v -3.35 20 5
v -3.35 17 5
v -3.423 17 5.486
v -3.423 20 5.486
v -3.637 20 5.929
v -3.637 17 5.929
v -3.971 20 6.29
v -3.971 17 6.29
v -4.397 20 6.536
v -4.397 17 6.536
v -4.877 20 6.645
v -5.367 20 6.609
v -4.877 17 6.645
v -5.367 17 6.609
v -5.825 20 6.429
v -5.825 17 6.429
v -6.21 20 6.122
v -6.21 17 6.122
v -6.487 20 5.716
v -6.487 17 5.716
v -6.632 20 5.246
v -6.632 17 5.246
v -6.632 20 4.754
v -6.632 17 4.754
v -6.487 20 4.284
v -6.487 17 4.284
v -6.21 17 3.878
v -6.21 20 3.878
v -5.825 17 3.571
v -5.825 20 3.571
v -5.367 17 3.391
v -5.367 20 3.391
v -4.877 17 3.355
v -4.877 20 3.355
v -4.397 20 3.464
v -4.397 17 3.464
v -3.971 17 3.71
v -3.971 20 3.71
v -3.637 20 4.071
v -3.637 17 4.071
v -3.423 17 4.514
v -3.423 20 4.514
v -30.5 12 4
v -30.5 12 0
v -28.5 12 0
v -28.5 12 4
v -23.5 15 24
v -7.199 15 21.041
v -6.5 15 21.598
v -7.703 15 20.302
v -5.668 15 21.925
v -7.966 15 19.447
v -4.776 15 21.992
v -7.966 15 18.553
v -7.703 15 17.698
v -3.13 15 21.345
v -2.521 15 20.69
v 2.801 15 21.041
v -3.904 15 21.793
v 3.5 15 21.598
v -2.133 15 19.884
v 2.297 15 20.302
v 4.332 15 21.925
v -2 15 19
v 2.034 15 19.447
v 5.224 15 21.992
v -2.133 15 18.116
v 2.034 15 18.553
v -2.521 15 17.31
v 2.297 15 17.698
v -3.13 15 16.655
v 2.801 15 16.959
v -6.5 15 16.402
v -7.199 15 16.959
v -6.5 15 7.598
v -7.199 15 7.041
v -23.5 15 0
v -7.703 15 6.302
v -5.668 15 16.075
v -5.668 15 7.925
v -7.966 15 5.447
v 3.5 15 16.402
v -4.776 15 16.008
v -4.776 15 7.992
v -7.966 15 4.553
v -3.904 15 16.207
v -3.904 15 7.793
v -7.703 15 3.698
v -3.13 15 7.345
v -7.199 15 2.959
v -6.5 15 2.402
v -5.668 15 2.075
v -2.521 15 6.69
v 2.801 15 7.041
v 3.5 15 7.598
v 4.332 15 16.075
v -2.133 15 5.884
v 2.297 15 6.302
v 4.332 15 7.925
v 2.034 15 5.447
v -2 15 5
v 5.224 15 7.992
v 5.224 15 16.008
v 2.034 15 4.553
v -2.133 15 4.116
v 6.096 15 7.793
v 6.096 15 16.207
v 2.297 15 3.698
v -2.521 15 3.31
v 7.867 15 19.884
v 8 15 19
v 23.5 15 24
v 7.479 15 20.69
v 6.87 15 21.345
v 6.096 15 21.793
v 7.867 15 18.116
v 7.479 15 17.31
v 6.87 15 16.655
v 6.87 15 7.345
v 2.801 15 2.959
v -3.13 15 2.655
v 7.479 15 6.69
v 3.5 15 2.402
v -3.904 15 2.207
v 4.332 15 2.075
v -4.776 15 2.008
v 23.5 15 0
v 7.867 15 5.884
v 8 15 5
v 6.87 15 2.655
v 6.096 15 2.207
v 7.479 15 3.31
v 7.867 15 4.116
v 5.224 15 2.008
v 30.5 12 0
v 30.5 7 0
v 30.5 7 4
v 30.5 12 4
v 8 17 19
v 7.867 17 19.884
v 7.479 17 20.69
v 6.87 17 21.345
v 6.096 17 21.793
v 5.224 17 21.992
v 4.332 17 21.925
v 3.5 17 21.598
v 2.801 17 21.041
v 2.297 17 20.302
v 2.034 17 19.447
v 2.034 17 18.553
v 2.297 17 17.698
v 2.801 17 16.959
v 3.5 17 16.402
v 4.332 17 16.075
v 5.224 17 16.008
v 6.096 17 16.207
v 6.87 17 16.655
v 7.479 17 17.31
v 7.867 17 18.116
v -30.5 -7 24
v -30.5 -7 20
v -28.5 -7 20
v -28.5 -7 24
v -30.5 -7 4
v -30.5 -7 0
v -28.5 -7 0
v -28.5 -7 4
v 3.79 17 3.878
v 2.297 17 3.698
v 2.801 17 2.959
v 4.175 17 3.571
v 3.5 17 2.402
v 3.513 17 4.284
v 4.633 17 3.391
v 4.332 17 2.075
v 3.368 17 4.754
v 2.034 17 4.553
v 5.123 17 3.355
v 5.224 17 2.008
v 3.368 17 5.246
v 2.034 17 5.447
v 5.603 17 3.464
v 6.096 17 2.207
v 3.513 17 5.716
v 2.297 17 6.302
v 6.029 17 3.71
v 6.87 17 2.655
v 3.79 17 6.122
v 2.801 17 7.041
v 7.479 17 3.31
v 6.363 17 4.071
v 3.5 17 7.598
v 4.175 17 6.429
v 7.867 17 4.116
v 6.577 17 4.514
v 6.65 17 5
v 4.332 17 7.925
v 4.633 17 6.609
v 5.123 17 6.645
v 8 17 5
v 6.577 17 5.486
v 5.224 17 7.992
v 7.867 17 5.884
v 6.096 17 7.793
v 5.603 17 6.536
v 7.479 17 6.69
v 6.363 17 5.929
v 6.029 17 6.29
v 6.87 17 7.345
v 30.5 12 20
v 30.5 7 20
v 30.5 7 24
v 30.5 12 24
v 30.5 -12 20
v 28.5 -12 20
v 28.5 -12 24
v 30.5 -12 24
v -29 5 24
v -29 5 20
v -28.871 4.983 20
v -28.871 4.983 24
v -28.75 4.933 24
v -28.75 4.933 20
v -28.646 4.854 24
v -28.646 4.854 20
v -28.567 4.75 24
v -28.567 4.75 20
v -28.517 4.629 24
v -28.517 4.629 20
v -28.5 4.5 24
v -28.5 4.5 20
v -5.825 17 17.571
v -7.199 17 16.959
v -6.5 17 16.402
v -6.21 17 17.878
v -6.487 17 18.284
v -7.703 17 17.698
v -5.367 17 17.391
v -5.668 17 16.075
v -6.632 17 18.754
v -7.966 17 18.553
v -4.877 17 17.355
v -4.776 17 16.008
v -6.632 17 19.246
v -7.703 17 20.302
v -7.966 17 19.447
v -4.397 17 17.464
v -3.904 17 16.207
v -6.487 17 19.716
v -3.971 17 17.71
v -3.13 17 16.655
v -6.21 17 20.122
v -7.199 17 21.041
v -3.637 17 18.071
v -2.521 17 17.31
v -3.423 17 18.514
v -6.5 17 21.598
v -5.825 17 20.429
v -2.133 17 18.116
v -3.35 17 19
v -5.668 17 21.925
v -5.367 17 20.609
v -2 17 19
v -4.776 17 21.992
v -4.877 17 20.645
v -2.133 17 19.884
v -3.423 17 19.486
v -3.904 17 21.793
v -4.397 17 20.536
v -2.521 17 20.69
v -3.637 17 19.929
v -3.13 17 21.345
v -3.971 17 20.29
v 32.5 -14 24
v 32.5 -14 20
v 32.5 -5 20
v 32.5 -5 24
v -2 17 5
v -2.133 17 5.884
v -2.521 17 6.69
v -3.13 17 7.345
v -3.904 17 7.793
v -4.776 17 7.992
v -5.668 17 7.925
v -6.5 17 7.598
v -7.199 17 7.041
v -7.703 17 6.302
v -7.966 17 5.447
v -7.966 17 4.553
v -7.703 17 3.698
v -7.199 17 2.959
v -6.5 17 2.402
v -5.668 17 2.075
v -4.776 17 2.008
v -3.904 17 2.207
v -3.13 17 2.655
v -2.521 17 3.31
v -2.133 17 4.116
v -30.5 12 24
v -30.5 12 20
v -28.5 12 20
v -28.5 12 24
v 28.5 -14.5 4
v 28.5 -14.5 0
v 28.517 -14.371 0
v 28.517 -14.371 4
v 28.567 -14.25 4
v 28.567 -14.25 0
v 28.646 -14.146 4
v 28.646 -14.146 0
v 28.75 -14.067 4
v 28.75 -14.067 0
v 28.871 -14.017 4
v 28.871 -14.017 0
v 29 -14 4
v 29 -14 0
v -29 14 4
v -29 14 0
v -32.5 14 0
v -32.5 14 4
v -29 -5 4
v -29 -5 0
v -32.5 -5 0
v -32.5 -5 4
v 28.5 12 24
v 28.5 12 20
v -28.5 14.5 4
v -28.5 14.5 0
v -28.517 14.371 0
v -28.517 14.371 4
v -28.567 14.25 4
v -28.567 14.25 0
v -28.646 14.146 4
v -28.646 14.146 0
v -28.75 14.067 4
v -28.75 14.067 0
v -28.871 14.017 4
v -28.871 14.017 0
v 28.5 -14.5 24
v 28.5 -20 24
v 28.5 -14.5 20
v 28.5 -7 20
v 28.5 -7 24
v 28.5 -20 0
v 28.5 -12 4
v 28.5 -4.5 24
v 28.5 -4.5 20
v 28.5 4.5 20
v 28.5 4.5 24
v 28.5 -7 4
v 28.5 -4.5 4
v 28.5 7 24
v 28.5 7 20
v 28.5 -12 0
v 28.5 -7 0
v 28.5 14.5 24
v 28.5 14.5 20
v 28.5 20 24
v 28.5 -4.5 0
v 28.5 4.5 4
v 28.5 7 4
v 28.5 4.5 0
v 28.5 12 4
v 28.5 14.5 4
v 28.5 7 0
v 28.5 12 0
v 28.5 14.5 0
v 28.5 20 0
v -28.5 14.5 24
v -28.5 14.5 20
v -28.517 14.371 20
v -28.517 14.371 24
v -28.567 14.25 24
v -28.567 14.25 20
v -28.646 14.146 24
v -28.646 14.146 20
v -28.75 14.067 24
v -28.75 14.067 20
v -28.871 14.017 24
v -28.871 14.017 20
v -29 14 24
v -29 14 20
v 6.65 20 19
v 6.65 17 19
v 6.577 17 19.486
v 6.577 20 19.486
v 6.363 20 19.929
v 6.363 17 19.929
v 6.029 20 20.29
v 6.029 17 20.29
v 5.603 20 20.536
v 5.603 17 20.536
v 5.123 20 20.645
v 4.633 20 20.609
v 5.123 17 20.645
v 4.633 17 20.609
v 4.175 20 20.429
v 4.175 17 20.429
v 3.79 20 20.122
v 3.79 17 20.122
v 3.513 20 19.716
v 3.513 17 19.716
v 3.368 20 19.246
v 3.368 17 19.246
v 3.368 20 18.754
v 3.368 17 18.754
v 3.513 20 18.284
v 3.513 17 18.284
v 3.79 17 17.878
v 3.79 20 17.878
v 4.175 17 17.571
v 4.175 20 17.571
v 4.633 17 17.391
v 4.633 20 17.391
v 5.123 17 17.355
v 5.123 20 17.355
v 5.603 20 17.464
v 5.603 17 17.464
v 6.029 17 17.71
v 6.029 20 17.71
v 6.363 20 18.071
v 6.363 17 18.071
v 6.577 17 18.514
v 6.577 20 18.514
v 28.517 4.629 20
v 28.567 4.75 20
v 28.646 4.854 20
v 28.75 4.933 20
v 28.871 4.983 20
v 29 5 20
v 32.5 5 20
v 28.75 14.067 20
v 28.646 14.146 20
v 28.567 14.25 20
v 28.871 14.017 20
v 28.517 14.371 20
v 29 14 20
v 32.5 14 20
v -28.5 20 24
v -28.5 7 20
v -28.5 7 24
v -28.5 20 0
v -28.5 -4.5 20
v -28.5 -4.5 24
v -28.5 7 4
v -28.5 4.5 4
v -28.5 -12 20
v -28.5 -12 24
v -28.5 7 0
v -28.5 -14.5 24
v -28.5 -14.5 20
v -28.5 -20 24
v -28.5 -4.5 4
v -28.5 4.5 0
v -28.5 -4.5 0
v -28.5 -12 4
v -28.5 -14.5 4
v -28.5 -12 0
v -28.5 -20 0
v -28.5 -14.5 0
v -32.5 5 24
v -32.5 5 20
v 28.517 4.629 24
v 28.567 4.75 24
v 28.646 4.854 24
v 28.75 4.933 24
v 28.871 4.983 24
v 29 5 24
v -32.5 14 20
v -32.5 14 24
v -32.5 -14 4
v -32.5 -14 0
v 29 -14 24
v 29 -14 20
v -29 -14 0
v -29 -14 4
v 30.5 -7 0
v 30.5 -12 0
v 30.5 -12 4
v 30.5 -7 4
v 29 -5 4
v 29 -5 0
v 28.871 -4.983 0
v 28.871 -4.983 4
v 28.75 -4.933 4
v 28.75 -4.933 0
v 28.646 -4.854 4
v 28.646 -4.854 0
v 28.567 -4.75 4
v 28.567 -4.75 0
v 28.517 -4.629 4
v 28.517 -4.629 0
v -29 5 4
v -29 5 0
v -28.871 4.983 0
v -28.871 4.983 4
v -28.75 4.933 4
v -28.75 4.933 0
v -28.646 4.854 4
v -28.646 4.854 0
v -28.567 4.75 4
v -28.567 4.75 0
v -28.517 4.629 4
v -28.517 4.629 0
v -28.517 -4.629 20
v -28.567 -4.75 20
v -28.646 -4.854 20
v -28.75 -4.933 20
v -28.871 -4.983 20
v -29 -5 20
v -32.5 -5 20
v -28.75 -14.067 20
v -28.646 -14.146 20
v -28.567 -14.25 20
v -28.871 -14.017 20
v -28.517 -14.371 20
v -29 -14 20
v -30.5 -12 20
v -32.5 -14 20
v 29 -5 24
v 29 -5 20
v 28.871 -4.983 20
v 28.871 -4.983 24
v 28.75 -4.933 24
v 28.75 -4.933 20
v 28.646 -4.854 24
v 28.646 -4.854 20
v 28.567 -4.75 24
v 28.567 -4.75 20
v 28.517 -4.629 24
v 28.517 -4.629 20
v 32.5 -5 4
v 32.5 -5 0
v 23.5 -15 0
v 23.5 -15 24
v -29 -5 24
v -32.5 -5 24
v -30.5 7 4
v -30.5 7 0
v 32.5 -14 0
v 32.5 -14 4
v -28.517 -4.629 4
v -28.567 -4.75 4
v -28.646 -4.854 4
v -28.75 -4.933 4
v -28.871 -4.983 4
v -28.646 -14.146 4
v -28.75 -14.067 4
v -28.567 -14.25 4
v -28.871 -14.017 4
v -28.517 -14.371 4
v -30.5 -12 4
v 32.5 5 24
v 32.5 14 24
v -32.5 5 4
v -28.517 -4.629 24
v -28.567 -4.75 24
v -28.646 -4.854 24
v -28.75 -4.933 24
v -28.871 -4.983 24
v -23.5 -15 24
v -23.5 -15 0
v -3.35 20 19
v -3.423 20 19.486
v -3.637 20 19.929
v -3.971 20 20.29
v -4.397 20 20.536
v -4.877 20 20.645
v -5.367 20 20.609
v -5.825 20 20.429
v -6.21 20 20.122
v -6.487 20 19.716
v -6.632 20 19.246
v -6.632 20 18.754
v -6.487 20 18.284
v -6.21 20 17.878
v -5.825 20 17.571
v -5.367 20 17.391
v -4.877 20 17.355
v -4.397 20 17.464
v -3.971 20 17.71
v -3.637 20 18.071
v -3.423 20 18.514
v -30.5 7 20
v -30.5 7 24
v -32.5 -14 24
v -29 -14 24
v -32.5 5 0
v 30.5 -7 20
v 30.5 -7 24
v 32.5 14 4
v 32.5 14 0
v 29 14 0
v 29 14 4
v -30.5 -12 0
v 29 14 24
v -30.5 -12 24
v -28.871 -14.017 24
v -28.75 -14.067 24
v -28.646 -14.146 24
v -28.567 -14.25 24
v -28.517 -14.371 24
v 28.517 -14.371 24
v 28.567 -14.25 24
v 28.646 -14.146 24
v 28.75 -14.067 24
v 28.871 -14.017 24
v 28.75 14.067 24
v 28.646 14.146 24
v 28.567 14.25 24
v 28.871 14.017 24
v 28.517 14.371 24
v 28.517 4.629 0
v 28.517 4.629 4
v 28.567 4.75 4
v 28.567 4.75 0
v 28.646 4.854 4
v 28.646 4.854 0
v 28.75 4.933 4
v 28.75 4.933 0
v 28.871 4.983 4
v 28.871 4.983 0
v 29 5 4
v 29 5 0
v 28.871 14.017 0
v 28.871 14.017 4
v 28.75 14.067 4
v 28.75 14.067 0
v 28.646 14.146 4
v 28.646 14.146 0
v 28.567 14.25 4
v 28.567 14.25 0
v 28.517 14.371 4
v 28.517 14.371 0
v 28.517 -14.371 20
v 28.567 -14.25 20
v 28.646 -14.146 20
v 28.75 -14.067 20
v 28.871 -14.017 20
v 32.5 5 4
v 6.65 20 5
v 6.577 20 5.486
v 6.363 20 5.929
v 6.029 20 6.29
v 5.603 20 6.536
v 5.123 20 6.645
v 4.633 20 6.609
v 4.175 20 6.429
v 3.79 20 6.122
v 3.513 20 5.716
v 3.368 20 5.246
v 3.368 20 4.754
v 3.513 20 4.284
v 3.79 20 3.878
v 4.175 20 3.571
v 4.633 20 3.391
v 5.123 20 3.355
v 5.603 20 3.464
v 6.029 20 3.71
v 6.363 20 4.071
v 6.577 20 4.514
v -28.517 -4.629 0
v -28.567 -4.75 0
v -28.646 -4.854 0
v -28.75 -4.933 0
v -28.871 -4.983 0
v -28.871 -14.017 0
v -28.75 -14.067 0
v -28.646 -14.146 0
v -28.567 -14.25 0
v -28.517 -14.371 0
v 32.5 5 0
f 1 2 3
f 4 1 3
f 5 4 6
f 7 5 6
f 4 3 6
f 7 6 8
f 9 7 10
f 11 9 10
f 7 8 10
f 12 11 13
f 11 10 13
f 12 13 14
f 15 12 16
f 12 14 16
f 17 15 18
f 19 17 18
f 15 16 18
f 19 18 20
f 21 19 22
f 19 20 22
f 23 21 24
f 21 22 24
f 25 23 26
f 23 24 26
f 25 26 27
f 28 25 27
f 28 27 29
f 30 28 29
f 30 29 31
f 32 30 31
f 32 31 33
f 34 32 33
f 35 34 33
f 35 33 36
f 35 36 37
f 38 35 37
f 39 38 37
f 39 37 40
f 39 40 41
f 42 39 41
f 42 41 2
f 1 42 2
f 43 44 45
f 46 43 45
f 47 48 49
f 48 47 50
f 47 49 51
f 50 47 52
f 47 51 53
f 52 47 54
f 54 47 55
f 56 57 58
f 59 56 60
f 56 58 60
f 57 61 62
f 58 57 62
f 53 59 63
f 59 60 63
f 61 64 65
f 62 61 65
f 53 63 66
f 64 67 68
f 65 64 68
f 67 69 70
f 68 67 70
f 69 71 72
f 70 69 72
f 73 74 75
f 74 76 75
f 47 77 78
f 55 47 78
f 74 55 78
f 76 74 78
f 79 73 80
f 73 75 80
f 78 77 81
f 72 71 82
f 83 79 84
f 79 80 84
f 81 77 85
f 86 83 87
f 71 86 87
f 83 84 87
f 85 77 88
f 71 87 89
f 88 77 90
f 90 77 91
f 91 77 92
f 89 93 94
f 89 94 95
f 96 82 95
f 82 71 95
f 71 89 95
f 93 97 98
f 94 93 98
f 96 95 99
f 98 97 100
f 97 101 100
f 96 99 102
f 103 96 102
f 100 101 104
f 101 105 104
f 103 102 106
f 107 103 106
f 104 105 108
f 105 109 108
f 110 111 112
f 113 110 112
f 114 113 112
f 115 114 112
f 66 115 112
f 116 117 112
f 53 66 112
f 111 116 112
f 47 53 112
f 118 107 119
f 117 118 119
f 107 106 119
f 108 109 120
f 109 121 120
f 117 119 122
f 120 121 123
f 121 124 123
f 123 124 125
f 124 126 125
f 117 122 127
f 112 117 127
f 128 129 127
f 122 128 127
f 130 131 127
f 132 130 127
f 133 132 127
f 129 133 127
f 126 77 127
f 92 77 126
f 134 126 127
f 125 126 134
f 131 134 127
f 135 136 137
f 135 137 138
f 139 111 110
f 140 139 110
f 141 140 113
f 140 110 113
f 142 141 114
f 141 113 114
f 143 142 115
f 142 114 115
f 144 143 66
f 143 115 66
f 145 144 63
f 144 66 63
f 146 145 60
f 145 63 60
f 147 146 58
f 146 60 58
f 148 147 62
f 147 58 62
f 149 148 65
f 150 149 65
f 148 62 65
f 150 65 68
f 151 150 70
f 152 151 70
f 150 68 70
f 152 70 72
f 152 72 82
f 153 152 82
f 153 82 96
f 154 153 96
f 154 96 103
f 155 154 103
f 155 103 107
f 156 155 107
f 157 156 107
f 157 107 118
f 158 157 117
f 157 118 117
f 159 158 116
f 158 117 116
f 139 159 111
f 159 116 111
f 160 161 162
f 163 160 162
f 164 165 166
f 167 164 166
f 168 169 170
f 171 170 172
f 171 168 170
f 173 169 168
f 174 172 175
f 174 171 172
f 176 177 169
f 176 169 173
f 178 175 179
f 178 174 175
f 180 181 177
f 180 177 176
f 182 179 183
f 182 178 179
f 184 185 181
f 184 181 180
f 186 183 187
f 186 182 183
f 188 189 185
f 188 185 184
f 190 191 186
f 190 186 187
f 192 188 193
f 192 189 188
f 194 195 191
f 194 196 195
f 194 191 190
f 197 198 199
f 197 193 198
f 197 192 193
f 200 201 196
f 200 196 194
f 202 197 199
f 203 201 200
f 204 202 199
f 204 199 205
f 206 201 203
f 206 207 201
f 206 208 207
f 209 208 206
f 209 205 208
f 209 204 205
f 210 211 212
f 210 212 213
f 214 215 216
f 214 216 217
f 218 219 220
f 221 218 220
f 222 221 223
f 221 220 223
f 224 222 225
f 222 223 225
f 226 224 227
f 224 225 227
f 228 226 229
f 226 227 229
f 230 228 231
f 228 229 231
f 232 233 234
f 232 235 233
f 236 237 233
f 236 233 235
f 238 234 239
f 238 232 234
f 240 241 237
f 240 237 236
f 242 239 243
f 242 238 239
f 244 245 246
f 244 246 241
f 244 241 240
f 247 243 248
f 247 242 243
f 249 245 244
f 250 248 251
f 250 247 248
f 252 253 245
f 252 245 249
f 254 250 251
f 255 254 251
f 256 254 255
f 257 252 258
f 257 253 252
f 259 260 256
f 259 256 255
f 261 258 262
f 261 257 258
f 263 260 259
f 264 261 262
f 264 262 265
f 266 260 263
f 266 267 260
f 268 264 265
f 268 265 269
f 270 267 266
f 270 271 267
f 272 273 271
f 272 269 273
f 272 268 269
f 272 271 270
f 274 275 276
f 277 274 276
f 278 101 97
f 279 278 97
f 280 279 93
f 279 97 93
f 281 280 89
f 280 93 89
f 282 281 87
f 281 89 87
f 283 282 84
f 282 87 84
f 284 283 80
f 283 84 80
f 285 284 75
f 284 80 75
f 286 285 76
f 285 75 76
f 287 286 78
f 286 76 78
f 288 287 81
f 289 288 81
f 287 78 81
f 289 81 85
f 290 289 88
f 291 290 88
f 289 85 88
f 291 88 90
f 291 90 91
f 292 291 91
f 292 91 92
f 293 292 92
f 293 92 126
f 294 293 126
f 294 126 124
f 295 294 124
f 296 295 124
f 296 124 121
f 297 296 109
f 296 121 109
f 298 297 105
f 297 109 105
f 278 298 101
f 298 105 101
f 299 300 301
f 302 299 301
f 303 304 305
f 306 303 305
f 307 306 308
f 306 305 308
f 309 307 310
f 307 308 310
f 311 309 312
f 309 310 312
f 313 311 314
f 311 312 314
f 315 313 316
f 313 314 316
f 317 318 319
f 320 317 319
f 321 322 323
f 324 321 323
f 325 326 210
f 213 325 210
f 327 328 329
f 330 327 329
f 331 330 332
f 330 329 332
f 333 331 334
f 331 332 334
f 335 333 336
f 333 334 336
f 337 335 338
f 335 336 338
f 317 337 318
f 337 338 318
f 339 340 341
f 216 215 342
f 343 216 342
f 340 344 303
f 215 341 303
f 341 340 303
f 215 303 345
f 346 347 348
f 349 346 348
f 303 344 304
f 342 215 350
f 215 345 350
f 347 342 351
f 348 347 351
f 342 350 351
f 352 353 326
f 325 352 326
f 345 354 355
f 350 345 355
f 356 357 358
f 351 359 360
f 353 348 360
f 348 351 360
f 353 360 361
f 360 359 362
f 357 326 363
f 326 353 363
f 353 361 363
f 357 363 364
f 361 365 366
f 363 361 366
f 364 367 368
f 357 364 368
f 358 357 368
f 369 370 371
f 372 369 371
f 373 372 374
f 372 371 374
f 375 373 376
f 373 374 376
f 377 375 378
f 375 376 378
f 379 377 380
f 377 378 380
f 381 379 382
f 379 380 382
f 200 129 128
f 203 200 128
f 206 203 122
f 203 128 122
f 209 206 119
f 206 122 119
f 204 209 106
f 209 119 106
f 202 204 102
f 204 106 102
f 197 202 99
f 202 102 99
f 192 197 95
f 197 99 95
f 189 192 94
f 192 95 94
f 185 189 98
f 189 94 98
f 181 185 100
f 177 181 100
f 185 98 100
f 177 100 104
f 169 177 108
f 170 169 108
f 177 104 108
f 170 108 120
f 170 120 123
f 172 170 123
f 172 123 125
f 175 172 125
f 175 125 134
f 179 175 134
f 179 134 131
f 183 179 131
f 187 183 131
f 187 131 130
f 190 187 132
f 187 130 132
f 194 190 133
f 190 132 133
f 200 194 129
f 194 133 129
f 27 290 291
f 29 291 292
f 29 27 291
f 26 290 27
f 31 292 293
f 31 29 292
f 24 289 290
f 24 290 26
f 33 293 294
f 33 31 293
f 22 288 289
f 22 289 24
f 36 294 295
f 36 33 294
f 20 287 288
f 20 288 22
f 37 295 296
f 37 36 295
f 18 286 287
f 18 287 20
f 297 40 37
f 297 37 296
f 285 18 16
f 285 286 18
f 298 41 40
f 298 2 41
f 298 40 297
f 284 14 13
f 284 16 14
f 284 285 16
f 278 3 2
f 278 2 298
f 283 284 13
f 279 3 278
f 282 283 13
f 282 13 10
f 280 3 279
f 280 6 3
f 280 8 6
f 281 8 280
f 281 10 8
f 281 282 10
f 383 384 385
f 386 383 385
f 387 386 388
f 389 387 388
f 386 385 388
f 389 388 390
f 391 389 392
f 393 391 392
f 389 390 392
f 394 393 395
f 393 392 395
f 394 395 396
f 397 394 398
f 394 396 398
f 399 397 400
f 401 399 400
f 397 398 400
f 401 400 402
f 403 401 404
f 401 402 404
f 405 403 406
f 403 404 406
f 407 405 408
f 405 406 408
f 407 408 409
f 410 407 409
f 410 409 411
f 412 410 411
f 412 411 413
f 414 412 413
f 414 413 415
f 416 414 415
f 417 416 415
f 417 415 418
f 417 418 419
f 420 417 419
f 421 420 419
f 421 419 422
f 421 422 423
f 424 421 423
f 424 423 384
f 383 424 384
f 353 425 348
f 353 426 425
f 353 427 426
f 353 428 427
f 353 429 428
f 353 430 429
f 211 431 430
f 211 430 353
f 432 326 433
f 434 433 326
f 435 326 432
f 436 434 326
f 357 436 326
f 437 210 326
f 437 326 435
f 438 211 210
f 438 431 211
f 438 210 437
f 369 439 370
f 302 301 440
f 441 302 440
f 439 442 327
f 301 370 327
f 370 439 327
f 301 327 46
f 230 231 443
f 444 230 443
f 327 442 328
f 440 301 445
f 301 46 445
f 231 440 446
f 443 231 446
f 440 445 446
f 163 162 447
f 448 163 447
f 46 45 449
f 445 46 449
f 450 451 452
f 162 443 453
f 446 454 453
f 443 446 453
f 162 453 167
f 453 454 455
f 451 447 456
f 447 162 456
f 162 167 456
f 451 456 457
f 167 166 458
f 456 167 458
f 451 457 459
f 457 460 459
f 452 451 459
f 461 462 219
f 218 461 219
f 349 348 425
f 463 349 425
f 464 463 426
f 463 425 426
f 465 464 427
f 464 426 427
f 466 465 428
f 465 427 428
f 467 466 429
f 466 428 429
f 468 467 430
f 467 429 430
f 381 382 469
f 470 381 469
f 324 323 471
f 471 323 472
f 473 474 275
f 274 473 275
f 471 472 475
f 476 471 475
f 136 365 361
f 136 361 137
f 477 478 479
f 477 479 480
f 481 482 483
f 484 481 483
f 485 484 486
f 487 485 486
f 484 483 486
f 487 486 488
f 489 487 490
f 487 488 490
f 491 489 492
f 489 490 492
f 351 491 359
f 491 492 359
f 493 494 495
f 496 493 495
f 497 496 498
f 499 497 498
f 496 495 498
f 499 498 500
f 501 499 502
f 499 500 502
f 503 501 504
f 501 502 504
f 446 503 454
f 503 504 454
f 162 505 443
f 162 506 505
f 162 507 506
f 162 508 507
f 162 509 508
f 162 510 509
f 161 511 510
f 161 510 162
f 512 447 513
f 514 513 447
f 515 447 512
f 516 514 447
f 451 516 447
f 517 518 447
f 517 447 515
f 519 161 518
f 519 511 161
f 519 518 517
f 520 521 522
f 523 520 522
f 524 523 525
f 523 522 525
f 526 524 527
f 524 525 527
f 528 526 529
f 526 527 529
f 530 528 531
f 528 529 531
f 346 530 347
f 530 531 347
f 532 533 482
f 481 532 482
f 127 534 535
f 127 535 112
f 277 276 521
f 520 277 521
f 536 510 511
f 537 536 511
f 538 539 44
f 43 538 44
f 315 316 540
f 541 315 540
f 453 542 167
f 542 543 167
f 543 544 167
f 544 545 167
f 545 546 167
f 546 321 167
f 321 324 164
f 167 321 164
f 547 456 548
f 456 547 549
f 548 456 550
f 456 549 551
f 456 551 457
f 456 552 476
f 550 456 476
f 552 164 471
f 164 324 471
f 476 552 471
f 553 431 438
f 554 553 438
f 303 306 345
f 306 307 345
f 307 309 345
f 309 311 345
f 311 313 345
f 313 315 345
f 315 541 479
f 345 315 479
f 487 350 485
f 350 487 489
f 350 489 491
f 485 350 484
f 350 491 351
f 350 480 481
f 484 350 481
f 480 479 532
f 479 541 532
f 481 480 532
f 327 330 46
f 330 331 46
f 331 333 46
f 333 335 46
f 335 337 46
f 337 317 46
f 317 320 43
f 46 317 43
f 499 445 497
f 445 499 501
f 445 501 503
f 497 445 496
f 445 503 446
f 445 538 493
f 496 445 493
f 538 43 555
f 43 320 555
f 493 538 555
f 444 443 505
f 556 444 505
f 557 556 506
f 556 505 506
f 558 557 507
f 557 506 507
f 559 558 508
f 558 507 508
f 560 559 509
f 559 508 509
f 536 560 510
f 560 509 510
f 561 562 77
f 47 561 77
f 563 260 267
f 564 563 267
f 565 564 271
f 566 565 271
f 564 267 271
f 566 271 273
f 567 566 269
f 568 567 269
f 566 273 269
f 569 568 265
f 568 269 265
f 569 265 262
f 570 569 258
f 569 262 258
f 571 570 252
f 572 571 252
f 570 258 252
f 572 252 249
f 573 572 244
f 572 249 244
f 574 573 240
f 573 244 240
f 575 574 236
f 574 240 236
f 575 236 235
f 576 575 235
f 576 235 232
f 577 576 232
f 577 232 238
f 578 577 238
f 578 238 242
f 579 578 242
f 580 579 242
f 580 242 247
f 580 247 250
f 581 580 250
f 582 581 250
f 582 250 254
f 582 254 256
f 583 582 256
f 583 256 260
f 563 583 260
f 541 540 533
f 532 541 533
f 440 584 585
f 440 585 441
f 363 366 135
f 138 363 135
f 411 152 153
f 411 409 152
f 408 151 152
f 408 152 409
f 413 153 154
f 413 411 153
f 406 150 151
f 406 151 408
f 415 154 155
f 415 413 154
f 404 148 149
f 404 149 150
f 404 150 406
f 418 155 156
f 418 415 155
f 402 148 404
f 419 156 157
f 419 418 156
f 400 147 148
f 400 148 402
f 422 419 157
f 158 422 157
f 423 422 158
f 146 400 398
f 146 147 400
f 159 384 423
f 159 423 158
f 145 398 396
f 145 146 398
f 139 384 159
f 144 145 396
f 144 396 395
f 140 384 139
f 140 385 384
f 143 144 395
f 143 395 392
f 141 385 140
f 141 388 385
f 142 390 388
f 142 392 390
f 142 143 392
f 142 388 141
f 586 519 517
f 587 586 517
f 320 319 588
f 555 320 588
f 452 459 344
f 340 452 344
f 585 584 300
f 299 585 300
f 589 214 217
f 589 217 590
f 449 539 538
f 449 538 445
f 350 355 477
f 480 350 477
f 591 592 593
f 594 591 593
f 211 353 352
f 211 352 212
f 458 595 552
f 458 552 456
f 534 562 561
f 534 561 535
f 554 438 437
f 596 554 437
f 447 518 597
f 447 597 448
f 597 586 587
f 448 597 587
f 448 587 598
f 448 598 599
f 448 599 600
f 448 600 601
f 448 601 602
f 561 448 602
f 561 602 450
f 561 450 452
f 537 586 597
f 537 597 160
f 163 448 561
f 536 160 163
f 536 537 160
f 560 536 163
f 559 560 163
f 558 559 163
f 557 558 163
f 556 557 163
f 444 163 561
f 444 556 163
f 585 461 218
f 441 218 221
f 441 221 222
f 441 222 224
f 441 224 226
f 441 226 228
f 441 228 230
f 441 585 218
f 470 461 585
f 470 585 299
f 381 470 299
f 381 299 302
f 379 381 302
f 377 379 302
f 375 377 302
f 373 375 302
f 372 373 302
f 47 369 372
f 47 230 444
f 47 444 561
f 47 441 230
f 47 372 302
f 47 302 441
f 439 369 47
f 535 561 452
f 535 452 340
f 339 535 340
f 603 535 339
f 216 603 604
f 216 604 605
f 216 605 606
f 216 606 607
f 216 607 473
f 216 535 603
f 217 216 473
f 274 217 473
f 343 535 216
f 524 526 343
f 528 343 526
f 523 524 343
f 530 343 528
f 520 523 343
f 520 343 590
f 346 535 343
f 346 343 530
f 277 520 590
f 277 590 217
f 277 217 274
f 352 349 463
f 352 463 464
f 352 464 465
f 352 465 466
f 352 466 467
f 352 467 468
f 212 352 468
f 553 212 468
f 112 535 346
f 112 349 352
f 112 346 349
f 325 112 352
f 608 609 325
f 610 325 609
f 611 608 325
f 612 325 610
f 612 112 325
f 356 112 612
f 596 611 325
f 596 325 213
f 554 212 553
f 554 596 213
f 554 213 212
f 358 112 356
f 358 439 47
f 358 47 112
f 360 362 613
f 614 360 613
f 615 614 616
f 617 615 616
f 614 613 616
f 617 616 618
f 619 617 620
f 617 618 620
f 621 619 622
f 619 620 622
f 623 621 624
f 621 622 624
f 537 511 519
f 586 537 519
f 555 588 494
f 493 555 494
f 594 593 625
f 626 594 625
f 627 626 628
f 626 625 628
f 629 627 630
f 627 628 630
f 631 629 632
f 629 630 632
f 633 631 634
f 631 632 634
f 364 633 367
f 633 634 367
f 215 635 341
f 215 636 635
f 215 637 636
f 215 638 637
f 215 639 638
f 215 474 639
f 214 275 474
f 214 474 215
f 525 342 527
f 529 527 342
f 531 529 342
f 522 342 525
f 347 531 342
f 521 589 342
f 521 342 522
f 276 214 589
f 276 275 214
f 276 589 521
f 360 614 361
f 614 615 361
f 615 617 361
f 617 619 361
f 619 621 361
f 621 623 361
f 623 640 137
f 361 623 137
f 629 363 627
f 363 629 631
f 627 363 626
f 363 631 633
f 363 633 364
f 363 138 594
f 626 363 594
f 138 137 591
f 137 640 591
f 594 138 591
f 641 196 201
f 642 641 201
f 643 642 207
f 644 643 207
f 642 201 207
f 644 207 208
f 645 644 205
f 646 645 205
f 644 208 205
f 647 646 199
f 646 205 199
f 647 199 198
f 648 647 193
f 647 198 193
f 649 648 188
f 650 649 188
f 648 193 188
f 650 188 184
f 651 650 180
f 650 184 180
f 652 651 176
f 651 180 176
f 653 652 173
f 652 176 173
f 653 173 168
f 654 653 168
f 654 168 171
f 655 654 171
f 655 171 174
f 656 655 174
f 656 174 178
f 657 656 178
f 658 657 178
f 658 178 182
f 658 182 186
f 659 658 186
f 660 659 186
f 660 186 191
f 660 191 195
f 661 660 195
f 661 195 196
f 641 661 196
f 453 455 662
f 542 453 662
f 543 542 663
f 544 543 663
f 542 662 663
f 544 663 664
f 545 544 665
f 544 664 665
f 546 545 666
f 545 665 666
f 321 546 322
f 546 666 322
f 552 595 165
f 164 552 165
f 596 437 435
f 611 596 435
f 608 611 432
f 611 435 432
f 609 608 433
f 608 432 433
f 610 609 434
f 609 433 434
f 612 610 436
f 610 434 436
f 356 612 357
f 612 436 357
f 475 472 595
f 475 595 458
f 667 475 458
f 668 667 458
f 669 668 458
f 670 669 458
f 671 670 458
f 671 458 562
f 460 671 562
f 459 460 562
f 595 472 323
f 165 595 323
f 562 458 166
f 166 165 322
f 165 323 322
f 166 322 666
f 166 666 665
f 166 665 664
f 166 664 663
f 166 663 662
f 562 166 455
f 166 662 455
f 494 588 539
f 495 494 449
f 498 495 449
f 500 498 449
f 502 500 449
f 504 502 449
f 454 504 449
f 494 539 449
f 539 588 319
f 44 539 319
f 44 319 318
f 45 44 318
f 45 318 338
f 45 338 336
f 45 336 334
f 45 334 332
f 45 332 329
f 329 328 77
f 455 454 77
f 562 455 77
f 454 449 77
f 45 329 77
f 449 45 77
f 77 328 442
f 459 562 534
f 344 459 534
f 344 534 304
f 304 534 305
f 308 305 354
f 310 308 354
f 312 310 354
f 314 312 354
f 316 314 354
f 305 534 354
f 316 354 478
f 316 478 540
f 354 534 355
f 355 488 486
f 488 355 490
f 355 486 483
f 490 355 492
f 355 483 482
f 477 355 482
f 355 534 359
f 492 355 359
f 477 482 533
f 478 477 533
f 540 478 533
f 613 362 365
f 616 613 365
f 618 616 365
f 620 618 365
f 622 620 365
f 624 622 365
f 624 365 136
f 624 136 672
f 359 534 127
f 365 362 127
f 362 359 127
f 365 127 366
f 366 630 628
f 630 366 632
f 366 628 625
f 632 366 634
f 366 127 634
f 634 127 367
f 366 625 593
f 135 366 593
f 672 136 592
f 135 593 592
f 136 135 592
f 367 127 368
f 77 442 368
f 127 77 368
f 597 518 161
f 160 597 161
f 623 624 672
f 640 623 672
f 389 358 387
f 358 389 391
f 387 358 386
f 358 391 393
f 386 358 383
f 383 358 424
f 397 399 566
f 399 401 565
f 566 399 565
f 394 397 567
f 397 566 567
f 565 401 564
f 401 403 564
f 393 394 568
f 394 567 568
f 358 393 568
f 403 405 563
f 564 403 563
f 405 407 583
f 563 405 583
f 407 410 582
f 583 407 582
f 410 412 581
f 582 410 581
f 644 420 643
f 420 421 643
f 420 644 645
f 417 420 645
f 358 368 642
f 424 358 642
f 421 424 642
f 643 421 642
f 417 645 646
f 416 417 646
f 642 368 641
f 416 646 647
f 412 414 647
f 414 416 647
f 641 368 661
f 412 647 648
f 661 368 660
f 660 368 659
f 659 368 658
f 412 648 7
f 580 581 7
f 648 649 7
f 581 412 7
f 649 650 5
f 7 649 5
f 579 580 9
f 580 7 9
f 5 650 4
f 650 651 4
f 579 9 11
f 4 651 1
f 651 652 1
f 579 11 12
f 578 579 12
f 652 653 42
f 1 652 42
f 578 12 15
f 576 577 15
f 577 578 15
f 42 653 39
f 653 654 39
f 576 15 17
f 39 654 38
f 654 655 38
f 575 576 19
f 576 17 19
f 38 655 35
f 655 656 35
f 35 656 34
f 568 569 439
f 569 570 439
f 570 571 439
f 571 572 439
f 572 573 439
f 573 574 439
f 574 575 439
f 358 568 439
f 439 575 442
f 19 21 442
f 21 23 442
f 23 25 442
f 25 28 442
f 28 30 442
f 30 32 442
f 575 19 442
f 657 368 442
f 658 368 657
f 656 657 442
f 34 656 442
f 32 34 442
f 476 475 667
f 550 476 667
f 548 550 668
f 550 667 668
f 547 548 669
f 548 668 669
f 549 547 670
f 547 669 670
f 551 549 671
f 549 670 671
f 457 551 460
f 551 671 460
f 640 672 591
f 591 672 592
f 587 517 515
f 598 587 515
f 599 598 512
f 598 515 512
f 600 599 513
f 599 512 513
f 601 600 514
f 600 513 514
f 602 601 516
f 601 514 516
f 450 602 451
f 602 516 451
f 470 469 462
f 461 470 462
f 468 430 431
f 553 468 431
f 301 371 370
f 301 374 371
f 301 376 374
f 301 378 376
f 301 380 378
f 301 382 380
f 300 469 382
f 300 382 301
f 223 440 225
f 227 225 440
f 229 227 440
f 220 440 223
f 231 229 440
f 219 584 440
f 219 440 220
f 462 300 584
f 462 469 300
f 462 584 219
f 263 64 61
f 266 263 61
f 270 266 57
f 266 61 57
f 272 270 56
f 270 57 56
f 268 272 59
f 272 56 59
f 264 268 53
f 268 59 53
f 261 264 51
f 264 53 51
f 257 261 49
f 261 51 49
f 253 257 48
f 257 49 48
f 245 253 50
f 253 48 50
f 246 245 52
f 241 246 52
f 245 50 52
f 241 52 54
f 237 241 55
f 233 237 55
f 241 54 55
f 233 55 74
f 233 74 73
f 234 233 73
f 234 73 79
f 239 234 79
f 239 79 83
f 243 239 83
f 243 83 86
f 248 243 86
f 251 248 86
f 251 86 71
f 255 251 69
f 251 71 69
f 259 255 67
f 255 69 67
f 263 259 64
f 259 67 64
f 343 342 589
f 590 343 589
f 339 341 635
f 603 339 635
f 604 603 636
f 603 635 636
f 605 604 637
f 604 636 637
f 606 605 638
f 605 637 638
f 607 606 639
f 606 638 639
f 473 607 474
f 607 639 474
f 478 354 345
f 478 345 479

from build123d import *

# Parameters (mm, degrees)
F0_W     = 2
F0_H     = 5
F0_W_2   = 47
F0_H_2   = 30
F1_DEPTH = 24
F2_W     = 40
F2_H     = 16
F3_DEPTH = 4
F4_W     = 40
F4_H     = 16
F5_DEPTH = 4
F6_R     = 1.65
F7_DEPTH = 25
F8_R     = 3
F9_DEPTH = 2


with BuildPart() as f1:
    # F0 (on Top) → F1 (new body)
    with BuildSketch(Plane.XY):
        with BuildLine():
            Line((28.5, 14.5), (28.5, 20))
            Line((28.5, 20), (-28.5, 20))
            Line((-28.5, 20), (-28.5, 14.5))
            ThreePointArc((-28.5, 14.5), (-28.646447, 14.146447), (-29, 14))
            Line((-29, 14), (-32.5, 14))
            Line((-32.5, 14), (-32.5, 5))
            Line((-32.5, 5), (-29, 5))
            ThreePointArc((-29, 5), (-28.646447, 4.853553), (-28.5, 4.5))
            Line((-28.5, 4.5), (-28.5, -4.5))
            ThreePointArc((-28.5, -4.5), (-28.646447, -4.853553), (-29, -5))
            Line((-29, -5), (-32.5, -5))
            Line((-32.5, -5), (-32.5, -14))
            Line((-32.5, -14), (-29, -14))
            ThreePointArc((-29, -14), (-28.646447, -14.146447), (-28.5, -14.5))
            Line((-28.5, -14.5), (-28.5, -20))
            Line((-28.5, -20), (28.5, -20))
            Line((28.5, -20), (28.5, -14.5))
            ThreePointArc((28.5, -14.5), (28.646447, -14.146447), (29, -14))
            Line((29, -14), (32.5, -14))
            Line((32.5, -14), (32.5, -5))
            Line((32.5, -5), (29, -5))
            ThreePointArc((29, -5), (28.646447, -4.853553), (28.5, -4.5))
            Line((28.5, -4.5), (28.5, 4.5))
            ThreePointArc((28.5, 4.5), (28.646447, 4.853553), (29, 5))
            Line((29, 5), (32.5, 5))
            Line((32.5, 5), (32.5, 14))
            Line((32.5, 14), (29, 14))
            ThreePointArc((29, 14), (28.646447, 14.146447), (28.5, 14.5))
        make_face()
        with Locations((-29.5, -9.5)):
            Rectangle(F0_W, F0_H, mode=Mode.SUBTRACT)
        with Locations((29.5, -9.5)):
            Rectangle(F0_W, F0_H, mode=Mode.SUBTRACT)
        with Locations((-29.5, 9.5)):
            Rectangle(F0_W, F0_H, mode=Mode.SUBTRACT)
        Rectangle(F0_W_2, F0_H_2, mode=Mode.SUBTRACT)
        with Locations((29.5, 9.5)):
            Rectangle(F0_W, F0_H, mode=Mode.SUBTRACT)
    extrude(amount=F1_DEPTH)

    # F2 (on face) → F3 (cut)
    with BuildSketch(Plane(origin=(-32.5, 0, 0), x_dir=(0, -1, 0), z_dir=(-1, 0, 0))):
        with Locations((0, 12)):
            Rectangle(F2_W, F2_H)
    extrude(amount=-F3_DEPTH, mode=Mode.SUBTRACT)

    # F4 (on face) → F5 (cut)
    with BuildSketch(Plane.YZ.offset(32.5)):
        with Locations((0, 12)):
            Rectangle(F4_W, F4_H)
    extrude(amount=-F5_DEPTH, mode=Mode.SUBTRACT)

    # F6 (on face) → F7 (cut)
    with BuildSketch(Plane.XZ.offset(-15)):
        with Locations((-5, 19)):
            Circle(F6_R)
        with Locations((-5, 5)):
            Circle(F6_R)
        with Locations((5, 19)):
            Circle(F6_R)
        with Locations((5, 5)):
            Circle(F6_R)
    extrude(amount=-F7_DEPTH, mode=Mode.SUBTRACT)

    # F8 (on face) → F9 (cut)
    with BuildSketch(Plane.XZ.offset(-15)):
        with Locations((-5, 19)):
            Circle(F8_R)
        with Locations((-5, 5)):
            Circle(F8_R)
        with Locations((5, 19)):
            Circle(F8_R)
        with Locations((5, 5)):
            Circle(F8_R)
    extrude(amount=-F9_DEPTH, mode=Mode.SUBTRACT)


solid = f1.part
